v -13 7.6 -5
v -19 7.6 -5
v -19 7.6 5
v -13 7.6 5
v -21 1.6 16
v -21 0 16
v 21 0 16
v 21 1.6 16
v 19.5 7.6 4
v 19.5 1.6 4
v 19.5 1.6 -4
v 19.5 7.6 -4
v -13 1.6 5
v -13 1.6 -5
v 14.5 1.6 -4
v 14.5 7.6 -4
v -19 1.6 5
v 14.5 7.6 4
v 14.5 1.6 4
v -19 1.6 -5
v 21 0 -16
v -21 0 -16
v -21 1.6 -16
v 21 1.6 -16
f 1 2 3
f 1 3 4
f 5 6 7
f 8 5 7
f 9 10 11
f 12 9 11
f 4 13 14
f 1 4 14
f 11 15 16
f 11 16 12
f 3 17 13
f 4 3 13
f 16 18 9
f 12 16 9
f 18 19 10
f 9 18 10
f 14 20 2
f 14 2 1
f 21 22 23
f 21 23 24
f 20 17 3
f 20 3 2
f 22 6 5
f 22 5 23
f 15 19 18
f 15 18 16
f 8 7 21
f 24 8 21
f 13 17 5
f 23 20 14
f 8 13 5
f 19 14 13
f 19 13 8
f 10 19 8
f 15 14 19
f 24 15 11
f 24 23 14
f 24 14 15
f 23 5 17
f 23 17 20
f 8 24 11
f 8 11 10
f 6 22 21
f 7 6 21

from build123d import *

# Parameters (mm, degrees)
SKETCH1_W             = 42
SKETCH1_H             = 32
BOARD_DEPTH           = 1.6
PROBE_CONNECTOR_START = 1.6
SKETCH2_W             = 6
SKETCH2_H             = 10
PROBE_CONNECTOR_DEPTH = 6
SIGNAL_HEADER_START   = 1.6
SKETCH3_W             = 5
SKETCH3_H             = 8
SIGNAL_HEADER_DEPTH   = 6


with BuildPart() as part:
    # Sketch1 → Board (new body)
    with BuildSketch(Plane(origin=(0, 0, 0), x_dir=(1, 0, 0), z_dir=(0, 1, 0))):
        Rectangle(SKETCH1_W, SKETCH1_H)
    extrude(amount=BOARD_DEPTH)

    # Sketch2 → Probe_Connector (add)
    with BuildSketch(Plane(origin=(0, 0, 0), x_dir=(1, 0, 0), z_dir=(0, 1, 0)).offset(PROBE_CONNECTOR_START)):
        with Locations((-16, 0)):
            Rectangle(SKETCH2_W, SKETCH2_H)
    extrude(amount=PROBE_CONNECTOR_DEPTH)

    # Sketch3 → Signal_Header (add)
    with BuildSketch(Plane(origin=(0, 0, 0), x_dir=(1, 0, 0), z_dir=(0, 1, 0)).offset(SIGNAL_HEADER_START)):
        with Locations((17, 0)):
            Rectangle(SKETCH3_W, SKETCH3_H)
    extrude(amount=SIGNAL_HEADER_DEPTH)


solid = part.part
